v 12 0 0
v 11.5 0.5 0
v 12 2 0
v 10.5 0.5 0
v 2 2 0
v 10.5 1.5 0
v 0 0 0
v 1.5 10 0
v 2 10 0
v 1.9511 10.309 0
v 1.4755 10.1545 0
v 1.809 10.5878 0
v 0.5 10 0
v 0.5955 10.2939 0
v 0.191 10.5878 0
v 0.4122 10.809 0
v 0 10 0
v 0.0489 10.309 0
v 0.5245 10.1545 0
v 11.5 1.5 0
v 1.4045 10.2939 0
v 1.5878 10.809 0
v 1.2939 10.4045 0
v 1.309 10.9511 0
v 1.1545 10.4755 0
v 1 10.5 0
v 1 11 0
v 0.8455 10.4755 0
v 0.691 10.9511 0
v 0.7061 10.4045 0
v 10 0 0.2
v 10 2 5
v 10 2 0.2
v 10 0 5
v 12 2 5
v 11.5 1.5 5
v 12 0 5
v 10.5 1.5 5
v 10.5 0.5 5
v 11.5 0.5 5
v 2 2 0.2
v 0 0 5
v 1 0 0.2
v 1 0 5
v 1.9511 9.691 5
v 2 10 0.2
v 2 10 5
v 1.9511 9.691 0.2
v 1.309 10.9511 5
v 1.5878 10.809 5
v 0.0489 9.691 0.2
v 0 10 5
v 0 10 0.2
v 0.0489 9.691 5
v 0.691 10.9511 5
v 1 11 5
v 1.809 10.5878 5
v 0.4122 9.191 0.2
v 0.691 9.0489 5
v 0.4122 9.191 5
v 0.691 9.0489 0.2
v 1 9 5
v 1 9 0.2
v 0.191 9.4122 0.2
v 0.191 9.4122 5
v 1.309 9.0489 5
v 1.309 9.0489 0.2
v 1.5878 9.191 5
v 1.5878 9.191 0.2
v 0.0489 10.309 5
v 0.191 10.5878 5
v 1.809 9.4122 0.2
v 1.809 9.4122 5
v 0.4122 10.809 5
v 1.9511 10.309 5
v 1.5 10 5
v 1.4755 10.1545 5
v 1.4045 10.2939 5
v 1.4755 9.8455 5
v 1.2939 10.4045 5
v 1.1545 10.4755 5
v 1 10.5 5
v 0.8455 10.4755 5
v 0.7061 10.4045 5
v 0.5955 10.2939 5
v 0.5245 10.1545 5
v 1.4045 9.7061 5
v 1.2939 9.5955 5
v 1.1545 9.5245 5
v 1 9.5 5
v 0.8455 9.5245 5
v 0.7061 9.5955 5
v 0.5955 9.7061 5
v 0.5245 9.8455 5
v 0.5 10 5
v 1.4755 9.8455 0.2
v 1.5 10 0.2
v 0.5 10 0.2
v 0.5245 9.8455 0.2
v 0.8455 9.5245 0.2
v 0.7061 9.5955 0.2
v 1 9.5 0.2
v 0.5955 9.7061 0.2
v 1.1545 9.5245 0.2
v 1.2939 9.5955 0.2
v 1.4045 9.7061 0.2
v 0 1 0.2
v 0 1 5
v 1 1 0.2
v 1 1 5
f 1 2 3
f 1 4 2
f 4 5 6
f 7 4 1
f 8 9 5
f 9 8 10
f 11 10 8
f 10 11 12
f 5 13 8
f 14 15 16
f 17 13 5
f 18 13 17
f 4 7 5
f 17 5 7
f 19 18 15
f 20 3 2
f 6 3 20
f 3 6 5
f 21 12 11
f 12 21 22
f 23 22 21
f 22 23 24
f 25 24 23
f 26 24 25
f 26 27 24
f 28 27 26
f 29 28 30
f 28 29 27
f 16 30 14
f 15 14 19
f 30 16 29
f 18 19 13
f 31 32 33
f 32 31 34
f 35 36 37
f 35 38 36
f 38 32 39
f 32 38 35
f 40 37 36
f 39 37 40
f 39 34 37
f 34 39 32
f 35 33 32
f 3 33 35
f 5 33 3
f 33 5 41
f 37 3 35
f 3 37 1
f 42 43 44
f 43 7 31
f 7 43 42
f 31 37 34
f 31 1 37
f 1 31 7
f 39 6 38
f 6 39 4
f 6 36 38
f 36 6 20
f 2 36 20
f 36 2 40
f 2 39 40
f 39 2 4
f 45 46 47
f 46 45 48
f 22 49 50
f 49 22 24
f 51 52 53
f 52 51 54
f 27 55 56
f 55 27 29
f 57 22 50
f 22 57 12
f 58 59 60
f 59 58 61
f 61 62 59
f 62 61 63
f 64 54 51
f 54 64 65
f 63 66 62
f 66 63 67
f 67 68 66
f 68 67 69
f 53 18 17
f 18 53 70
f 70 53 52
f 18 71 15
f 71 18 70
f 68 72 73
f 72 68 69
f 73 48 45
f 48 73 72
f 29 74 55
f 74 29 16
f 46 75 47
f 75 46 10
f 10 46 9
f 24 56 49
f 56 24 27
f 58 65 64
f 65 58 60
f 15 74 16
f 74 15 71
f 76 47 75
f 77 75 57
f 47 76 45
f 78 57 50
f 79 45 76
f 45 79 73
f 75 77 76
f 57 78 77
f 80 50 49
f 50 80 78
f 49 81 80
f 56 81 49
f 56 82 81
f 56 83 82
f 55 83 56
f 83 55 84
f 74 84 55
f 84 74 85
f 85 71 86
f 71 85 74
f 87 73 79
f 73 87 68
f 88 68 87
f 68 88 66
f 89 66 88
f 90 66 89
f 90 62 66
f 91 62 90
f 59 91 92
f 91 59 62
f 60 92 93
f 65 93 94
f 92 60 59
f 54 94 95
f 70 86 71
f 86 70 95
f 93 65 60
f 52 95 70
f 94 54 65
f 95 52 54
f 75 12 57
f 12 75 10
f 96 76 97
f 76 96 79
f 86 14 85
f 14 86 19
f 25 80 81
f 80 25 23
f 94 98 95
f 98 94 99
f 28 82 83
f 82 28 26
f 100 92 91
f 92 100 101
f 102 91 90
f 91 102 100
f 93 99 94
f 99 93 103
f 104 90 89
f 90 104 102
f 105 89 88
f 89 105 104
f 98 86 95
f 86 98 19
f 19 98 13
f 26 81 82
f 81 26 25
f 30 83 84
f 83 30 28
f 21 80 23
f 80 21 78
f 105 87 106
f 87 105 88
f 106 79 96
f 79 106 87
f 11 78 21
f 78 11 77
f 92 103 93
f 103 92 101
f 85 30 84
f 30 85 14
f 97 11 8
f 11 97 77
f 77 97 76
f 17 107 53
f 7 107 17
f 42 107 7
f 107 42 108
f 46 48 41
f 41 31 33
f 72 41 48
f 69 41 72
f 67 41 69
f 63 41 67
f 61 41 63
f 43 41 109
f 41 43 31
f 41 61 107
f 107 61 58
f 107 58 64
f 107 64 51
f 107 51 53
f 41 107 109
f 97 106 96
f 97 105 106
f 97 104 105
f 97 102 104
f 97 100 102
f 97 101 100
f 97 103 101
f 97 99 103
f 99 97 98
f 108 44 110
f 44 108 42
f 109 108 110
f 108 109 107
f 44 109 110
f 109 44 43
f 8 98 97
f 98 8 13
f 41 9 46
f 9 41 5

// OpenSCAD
//@set_slicing_config(../../slicing/test.ini)
h=5;
a=10;
b=2;
s=1;
$fn=20;
linear_extrude(height = 0.20)
    square([a,b]);
    
linear_extrude(height = h)
    square(s);

difference(){
translate([a,0,0])    
linear_extrude(height = h)
    square(2*s);
translate([a+s/2,s/2,0])    
  linear_extrude(height = h+1)
    square(1);
}


linear_extrude(height = 0.20)
    square([b,a]);

difference(){
translate([s,a,0])    
linear_extrude(height = h)
    circle(s);
translate([s,a,0])    
  linear_extrude(height = h+1)
    circle(s/2);
}
